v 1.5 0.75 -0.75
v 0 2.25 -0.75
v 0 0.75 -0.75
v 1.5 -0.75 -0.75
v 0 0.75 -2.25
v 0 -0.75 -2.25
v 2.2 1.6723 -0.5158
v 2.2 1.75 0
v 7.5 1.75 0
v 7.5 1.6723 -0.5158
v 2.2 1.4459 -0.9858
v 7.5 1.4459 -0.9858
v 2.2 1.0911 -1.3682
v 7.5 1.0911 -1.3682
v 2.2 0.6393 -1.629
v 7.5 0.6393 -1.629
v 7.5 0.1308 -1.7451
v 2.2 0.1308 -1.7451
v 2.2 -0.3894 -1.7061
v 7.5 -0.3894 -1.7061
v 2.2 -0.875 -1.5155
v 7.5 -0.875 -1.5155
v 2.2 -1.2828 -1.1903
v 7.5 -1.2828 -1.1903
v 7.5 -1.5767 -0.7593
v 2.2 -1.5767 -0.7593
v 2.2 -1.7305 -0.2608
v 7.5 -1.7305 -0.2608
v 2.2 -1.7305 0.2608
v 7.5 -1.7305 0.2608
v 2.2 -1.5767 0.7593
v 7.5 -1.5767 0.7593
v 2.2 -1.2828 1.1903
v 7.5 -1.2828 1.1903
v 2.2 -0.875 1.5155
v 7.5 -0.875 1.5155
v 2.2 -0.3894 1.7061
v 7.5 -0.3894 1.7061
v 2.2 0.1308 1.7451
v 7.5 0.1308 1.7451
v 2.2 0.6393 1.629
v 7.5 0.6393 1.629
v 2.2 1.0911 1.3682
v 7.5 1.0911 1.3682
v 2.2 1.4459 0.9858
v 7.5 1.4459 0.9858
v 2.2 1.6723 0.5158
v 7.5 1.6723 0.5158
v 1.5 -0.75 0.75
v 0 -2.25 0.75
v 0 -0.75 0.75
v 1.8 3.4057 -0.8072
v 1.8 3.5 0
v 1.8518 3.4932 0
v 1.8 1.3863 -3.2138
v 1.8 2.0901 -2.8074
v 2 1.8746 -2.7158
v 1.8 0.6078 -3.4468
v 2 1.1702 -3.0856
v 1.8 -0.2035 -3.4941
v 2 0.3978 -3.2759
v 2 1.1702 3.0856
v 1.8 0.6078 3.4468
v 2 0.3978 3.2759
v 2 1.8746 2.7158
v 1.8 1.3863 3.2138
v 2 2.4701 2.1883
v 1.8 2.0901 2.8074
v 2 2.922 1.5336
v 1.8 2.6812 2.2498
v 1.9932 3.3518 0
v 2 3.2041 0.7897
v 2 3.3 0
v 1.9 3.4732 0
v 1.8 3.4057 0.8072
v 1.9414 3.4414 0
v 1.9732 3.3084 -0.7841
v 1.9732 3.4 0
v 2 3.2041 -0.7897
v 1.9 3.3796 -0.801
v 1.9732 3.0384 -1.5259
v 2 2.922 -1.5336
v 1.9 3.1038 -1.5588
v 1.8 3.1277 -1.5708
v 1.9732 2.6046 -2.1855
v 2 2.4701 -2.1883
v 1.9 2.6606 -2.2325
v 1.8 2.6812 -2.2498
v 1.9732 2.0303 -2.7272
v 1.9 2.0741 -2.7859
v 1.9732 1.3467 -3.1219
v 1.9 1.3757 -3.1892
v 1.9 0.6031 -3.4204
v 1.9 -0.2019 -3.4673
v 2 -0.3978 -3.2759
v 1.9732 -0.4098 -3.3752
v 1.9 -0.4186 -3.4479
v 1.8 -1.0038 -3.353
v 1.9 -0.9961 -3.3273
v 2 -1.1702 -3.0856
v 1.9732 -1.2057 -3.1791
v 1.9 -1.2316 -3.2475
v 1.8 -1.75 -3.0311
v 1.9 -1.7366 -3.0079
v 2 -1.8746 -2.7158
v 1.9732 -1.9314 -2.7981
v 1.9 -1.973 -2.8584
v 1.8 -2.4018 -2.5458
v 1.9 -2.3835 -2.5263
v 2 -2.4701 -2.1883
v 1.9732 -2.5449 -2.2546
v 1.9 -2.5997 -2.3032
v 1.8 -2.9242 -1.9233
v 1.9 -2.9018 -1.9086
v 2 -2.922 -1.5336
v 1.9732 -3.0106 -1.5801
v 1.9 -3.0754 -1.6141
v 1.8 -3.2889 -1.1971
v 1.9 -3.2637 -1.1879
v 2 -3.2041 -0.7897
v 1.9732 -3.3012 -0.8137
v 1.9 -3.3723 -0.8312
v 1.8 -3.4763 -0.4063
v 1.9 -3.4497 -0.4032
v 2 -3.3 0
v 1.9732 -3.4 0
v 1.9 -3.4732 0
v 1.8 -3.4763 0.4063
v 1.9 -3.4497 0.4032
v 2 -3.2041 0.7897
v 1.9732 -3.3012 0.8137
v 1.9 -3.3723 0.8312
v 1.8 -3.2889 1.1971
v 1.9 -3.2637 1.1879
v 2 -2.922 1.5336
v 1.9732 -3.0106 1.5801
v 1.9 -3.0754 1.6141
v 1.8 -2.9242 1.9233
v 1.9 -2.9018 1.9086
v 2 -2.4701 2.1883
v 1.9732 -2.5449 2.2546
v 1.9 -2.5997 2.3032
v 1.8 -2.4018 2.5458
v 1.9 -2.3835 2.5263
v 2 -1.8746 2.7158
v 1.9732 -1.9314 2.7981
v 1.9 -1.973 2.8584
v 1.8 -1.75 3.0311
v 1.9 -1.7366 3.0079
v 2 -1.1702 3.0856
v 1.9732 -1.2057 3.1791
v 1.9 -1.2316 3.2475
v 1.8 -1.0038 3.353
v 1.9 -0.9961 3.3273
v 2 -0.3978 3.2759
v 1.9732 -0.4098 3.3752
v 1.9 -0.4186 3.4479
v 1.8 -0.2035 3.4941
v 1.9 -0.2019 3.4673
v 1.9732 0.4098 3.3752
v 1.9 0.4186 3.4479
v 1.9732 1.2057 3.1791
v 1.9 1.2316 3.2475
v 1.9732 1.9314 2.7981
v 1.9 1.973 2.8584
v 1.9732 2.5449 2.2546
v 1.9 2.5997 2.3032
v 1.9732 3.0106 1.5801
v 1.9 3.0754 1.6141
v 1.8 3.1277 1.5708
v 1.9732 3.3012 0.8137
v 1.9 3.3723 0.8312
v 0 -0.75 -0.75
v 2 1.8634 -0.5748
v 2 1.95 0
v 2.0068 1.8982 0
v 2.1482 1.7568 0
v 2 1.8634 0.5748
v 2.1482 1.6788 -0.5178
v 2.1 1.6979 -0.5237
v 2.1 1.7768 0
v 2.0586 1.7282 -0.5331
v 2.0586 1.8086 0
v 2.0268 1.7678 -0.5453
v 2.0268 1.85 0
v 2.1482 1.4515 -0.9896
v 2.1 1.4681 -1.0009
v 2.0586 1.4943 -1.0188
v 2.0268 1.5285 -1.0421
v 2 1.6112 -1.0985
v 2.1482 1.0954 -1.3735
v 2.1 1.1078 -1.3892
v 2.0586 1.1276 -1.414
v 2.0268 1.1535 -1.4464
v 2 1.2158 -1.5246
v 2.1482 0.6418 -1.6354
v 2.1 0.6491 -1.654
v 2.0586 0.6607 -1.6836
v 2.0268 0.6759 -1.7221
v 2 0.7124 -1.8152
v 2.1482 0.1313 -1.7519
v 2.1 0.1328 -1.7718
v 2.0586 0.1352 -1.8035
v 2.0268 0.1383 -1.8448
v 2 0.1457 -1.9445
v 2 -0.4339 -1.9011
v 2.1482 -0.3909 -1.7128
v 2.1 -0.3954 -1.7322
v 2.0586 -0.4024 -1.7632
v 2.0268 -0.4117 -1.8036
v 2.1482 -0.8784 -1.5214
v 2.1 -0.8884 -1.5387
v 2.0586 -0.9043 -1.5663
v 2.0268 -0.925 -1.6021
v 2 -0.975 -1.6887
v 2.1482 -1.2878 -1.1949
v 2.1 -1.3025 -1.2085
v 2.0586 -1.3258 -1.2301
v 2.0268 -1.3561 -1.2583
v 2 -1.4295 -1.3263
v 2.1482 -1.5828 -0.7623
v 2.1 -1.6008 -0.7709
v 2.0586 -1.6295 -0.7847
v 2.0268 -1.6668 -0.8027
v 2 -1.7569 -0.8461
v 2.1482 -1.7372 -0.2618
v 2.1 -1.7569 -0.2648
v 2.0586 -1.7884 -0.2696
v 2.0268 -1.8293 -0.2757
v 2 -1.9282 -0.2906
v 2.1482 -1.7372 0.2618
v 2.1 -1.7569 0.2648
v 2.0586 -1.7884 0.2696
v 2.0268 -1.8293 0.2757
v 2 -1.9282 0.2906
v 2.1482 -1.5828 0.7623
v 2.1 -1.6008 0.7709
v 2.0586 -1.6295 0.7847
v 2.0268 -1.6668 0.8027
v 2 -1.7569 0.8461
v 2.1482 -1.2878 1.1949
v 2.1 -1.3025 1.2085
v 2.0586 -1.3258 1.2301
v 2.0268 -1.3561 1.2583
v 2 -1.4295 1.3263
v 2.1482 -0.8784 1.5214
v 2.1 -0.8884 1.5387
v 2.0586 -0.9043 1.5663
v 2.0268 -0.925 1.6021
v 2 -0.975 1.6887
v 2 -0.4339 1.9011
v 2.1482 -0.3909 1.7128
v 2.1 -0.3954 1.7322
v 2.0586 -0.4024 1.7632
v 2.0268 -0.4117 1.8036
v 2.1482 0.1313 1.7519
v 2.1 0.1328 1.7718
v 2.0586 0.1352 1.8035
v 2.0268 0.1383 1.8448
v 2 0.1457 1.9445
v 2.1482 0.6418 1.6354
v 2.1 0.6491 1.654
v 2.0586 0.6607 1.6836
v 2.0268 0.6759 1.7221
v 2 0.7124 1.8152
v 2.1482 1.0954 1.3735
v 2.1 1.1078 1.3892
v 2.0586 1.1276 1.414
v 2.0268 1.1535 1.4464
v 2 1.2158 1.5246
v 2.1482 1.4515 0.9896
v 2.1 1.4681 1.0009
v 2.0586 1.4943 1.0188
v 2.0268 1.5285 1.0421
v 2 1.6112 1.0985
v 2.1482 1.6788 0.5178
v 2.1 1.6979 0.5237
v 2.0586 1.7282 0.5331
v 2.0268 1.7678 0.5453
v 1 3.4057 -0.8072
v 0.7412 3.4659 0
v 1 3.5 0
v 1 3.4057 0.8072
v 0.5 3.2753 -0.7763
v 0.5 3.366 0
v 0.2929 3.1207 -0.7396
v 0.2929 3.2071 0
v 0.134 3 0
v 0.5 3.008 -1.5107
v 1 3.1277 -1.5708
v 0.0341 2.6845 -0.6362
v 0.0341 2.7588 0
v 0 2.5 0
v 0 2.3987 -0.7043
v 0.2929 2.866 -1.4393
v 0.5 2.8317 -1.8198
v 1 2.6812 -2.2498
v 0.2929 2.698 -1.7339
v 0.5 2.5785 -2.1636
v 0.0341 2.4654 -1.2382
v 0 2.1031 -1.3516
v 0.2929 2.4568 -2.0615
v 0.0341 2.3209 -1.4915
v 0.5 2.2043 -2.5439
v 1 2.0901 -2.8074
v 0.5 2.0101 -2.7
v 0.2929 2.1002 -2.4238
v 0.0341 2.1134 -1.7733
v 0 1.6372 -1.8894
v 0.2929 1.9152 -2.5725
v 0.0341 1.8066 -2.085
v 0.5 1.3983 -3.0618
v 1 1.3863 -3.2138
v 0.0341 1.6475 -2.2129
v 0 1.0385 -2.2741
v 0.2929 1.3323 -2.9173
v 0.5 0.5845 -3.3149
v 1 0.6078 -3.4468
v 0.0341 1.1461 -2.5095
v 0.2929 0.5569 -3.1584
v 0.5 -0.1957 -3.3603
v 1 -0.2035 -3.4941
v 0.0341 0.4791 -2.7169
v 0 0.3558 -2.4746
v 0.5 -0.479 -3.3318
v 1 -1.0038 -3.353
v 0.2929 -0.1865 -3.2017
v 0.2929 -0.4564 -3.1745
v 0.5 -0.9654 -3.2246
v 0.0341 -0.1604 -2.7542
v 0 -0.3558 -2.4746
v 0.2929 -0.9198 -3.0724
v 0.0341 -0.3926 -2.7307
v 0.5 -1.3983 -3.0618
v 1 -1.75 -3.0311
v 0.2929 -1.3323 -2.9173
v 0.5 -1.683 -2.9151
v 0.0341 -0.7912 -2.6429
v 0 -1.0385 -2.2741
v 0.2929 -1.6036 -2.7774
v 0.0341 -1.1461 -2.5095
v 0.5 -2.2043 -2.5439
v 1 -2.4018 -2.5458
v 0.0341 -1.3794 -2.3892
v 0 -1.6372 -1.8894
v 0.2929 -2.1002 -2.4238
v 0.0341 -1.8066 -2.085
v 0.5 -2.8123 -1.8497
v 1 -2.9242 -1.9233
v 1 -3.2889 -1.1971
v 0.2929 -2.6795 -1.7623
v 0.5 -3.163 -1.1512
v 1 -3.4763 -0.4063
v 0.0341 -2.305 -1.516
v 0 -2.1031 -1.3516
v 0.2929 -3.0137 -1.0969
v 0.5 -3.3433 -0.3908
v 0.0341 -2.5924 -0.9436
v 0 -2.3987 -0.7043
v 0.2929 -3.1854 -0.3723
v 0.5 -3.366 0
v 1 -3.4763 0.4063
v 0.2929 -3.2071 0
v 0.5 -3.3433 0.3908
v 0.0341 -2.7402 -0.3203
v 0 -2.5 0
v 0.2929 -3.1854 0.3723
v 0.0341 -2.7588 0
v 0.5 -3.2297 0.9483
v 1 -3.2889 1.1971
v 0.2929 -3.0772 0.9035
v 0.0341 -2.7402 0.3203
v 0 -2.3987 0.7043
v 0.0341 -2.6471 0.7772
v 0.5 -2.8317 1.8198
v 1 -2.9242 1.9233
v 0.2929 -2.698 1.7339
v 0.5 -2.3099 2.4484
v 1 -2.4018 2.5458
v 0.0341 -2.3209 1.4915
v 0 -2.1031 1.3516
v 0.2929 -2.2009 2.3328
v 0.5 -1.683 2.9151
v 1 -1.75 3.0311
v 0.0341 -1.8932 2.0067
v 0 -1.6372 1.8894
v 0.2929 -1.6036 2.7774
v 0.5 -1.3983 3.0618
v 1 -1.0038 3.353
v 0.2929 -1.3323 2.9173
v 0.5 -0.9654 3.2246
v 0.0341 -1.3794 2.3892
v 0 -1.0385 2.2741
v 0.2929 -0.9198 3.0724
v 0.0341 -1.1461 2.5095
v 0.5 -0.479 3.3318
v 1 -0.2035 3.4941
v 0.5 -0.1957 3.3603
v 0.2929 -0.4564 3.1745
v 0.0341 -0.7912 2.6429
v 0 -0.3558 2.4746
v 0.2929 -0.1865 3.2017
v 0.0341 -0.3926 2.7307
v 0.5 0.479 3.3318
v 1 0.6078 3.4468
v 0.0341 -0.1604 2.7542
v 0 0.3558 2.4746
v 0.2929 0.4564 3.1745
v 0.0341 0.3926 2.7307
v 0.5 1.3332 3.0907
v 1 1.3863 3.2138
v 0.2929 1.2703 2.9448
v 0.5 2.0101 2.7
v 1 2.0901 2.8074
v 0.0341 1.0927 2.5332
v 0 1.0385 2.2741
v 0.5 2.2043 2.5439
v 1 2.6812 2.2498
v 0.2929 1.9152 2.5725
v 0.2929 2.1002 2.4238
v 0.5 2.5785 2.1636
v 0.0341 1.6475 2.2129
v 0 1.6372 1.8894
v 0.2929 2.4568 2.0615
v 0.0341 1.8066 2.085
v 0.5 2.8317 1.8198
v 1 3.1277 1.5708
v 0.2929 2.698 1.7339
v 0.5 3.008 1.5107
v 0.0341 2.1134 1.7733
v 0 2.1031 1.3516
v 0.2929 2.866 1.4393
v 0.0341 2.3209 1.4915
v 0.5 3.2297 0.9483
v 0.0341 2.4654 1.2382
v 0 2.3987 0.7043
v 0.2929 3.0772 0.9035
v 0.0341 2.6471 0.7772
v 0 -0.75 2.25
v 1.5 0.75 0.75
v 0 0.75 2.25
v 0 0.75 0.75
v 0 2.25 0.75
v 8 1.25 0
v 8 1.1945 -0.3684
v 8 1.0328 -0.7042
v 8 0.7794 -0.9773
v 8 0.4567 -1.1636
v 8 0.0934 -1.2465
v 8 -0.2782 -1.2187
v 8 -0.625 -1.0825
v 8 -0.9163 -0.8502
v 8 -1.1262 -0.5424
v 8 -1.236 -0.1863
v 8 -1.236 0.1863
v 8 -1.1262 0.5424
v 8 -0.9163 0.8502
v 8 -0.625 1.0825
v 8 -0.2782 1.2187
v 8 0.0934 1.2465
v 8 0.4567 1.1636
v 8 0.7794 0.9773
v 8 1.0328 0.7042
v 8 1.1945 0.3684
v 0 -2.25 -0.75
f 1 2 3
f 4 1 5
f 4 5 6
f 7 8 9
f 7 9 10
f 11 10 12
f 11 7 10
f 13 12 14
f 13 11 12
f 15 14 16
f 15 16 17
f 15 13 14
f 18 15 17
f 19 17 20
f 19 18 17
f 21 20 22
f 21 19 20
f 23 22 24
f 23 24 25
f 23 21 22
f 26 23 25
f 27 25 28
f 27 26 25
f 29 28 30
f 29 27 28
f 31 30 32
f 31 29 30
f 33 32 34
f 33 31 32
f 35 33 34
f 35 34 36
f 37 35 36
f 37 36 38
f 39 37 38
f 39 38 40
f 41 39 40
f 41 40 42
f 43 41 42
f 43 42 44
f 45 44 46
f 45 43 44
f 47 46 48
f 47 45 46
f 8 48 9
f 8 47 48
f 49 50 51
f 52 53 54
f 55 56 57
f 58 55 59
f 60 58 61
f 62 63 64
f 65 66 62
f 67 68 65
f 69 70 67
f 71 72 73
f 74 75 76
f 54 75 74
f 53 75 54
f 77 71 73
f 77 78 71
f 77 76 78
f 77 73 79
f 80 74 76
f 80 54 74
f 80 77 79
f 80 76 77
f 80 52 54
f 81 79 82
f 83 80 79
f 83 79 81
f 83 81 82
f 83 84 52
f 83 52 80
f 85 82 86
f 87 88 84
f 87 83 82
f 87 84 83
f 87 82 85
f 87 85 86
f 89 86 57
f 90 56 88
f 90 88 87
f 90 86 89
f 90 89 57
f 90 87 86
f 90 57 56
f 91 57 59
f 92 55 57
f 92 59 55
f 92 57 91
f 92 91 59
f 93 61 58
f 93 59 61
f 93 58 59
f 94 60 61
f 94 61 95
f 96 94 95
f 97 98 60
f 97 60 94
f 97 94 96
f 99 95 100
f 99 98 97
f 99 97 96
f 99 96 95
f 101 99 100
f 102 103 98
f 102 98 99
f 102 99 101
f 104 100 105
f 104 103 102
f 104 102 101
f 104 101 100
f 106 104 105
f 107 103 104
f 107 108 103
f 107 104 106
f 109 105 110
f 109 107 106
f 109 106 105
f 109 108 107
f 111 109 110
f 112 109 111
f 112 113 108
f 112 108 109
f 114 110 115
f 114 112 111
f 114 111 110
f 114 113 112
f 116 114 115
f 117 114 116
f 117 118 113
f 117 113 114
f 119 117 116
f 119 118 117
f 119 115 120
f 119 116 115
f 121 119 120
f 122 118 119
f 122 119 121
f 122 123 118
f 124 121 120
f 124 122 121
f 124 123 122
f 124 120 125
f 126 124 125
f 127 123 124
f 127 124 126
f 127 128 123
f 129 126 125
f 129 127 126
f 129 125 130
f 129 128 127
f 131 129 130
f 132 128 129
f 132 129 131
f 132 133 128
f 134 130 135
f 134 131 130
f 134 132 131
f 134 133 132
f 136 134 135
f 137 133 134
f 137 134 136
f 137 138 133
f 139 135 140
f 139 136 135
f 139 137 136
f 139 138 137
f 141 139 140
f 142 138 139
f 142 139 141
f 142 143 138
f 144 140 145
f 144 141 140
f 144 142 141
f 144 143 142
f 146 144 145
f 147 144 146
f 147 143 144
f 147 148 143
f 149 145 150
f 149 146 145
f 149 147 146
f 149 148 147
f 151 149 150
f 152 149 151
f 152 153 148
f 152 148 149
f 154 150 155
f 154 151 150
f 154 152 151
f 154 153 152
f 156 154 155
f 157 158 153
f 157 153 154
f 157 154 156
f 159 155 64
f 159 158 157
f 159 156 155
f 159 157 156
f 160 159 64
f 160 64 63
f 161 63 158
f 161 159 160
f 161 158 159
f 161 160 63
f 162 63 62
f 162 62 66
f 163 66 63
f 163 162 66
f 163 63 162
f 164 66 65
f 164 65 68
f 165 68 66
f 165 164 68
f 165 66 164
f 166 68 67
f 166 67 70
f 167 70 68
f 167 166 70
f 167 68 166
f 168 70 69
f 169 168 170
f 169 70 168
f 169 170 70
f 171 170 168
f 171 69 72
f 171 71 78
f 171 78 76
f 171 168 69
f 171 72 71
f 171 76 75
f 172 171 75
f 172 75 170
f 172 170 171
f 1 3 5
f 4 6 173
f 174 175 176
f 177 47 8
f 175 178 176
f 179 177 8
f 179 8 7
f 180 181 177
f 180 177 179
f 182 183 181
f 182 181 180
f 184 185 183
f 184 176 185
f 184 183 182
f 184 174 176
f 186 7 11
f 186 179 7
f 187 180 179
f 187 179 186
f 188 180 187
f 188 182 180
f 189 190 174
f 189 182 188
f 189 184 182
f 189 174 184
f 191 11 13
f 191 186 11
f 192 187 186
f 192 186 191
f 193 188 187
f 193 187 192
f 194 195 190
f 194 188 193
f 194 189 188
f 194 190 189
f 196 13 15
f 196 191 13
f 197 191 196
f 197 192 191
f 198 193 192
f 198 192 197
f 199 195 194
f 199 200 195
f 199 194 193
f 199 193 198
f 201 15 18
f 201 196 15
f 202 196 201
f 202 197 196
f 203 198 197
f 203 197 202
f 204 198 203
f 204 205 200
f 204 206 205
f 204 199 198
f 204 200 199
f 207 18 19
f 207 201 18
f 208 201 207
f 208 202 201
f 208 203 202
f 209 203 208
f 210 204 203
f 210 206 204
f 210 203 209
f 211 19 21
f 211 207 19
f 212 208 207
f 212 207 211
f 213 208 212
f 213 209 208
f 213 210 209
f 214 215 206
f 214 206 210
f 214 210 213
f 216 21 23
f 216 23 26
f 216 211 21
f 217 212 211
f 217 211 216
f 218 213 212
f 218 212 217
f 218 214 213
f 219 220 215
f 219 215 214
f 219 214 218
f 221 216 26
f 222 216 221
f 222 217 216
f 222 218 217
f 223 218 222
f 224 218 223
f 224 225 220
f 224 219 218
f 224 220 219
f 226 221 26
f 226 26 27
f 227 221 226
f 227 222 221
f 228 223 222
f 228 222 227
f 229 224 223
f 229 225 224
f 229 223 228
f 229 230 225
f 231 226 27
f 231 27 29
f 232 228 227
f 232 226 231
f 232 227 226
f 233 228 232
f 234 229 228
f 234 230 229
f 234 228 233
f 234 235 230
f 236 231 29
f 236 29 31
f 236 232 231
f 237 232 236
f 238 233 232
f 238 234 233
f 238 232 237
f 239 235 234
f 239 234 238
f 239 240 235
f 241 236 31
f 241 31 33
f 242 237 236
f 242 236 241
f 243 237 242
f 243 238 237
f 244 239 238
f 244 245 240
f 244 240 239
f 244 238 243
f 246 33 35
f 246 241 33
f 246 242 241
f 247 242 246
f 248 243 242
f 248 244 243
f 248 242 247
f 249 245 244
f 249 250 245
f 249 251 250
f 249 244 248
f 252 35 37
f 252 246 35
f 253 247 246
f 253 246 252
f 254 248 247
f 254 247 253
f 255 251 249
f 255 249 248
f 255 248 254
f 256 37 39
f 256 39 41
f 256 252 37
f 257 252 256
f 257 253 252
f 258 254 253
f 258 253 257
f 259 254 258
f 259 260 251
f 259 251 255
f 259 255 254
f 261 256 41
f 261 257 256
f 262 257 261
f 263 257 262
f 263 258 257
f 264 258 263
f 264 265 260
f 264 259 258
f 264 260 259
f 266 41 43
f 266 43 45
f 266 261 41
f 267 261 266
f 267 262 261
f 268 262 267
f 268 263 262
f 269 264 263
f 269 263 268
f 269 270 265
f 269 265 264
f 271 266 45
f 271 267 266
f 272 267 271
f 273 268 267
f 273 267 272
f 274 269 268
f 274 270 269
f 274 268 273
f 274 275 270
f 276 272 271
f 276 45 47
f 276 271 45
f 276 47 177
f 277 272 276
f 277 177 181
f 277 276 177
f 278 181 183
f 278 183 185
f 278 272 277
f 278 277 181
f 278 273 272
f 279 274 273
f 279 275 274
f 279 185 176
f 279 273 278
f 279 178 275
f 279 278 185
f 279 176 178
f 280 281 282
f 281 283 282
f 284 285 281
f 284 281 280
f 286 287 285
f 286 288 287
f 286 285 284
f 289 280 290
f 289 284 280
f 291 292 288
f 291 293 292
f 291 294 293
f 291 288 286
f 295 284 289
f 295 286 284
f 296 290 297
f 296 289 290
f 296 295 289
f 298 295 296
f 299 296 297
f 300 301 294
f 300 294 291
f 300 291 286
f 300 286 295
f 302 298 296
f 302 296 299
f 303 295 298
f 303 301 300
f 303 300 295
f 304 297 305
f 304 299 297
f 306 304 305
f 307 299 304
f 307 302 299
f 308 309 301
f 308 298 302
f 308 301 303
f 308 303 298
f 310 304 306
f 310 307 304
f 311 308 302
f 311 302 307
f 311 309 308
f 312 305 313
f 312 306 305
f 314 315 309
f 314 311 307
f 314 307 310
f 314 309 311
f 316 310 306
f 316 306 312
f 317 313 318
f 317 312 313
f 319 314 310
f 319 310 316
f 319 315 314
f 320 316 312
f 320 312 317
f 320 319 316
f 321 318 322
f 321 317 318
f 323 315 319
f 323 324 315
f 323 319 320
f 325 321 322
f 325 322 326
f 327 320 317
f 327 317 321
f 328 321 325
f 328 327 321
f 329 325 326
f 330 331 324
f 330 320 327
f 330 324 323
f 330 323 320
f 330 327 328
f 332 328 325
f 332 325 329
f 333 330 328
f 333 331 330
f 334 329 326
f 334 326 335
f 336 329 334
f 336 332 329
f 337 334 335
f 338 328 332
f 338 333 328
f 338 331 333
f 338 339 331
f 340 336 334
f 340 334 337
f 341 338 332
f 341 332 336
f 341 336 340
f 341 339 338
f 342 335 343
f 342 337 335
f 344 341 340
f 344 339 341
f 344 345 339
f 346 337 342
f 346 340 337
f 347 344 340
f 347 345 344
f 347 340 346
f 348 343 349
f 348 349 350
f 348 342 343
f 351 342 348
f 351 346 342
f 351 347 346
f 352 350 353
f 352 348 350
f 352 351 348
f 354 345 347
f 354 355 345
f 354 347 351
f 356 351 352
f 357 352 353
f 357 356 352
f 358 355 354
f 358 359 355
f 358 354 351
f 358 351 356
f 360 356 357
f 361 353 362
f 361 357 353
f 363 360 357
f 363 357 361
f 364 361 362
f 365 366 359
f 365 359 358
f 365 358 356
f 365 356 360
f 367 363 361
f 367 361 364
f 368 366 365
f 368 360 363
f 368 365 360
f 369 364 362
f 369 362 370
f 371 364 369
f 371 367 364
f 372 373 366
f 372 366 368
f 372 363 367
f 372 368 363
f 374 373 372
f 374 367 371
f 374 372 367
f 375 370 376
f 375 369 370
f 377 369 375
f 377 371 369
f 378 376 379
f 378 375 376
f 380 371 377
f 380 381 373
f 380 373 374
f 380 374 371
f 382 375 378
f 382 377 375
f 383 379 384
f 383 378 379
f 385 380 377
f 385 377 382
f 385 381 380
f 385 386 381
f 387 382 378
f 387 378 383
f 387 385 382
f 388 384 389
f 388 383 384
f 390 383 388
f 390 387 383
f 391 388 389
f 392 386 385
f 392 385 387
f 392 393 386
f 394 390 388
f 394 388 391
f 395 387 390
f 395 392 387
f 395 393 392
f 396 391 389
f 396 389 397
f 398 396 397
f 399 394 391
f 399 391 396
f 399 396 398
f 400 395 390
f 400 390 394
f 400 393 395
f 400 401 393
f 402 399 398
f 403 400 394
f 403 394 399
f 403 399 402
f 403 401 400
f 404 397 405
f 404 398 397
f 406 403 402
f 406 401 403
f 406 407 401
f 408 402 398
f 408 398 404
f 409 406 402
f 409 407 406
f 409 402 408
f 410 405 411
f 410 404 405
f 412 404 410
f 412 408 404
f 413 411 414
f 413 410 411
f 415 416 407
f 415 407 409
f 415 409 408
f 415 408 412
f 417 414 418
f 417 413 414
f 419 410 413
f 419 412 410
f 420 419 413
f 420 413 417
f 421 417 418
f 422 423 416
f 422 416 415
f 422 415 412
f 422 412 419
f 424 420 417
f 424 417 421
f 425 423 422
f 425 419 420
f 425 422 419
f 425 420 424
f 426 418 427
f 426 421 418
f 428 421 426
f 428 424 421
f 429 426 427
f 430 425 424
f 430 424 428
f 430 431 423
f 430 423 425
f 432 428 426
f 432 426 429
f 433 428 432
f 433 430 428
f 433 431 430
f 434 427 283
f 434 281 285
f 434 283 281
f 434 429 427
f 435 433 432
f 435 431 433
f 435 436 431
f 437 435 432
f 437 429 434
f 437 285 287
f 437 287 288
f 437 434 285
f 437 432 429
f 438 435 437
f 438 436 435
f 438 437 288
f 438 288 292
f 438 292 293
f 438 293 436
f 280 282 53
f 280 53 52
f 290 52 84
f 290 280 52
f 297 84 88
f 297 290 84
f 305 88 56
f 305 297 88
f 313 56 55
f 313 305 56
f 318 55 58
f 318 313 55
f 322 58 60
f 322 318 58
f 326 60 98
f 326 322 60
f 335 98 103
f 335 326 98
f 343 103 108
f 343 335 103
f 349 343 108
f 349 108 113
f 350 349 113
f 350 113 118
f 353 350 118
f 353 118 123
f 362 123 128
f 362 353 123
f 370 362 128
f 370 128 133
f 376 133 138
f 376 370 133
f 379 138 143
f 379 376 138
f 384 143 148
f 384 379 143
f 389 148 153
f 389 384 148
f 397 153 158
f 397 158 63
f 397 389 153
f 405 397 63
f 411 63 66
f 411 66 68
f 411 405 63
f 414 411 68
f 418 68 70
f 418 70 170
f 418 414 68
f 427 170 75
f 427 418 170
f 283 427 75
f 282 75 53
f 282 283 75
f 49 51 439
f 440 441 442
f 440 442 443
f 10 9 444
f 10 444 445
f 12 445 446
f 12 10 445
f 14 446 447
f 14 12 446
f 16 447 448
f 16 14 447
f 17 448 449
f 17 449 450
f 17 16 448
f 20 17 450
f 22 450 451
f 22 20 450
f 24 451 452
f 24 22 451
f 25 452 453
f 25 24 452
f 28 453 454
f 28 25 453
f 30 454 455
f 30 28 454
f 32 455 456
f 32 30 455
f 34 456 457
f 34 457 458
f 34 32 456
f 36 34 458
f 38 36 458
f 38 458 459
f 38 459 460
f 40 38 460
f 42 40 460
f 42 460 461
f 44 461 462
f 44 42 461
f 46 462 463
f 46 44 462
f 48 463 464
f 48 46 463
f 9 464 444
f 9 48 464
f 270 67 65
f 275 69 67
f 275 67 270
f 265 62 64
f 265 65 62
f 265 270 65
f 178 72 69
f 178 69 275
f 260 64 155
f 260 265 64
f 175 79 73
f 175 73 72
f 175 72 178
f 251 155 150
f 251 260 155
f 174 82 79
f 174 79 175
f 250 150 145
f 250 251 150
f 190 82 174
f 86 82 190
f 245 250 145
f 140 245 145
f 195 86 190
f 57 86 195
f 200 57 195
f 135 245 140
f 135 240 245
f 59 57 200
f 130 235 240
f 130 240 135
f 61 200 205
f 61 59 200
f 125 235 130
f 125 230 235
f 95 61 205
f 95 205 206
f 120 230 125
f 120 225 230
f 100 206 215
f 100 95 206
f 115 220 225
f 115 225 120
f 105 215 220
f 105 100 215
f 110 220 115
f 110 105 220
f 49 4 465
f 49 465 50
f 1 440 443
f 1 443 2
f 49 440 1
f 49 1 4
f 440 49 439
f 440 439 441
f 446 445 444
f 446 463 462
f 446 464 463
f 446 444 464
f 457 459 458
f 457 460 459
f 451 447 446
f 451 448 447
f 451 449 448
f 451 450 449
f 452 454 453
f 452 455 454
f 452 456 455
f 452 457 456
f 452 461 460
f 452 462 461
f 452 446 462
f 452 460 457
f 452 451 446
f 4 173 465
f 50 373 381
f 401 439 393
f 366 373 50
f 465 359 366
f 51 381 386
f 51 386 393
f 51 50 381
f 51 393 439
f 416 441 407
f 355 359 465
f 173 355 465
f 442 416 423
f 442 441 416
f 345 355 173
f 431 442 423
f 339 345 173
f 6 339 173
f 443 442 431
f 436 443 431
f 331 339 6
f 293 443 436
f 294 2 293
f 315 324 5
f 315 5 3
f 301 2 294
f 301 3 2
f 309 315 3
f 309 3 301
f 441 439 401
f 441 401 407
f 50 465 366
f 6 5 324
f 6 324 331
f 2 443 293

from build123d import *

# Parameters (mm, degrees)
F2_SIZE  = 0.5
F3_R     = 0.2
F4_R     = 0.2
F5_R     = 1
F7_DEPTH = 1.5
F8_SIZE  = 1.49999


# Not quite as in the source:
# - a fillet or chamfer is up to 0.001 mm smaller than in the source, because OpenCascade refuses the exact size


with BuildPart() as f1:
    # F0 (on Top) → F1 (revolve)
    with BuildSketch(Plane.XY):
        Polygon((0, 3.5), (0, 0), (8, 0), (8, 1.75), (2, 1.75), (2, 3.5), align=None)
    revolve(axis=Axis((4, 0, 0), (-1, 0, 0)))

    # F2
    f2_edges = [f1.edges().sort_by_distance(p)[0] for p in [
        (8, -1.75, 0),
    ]]
    chamfer(f2_edges, length=F2_SIZE)

    # F3
    f3_edges = [f1.edges().sort_by_distance(p)[0] for p in [
        (2, -1.75, 0),
    ]]
    fillet(f3_edges, radius=F3_R)

    # F4
    f4_edges = [f1.edges().sort_by_distance(p)[0] for p in [
        (2, -3.5, 0),
    ]]
    fillet(f4_edges, radius=F4_R)

    # F5
    f5_edges = [f1.edges().sort_by_distance(p)[0] for p in [
        (0, -3.5, 0),
    ]]
    fillet(f5_edges, radius=F5_R)

    # F6 (on face) → F7 (cut)
    with BuildSketch(Plane(origin=(0, 0, 0), x_dir=(0, -1, 0), z_dir=(-1, 0, 0))):
        Polygon((-0.75, 2.25), (-0.75, 0.75), (-2.25, 0.75), (-2.25, -0.75), (-0.75, -0.75), (-0.75, -2.25), (0.75, -2.25), (0.75, -0.75), (2.25, -0.75), (2.25, 0.75), (0.75, 0.75), (0.75, 2.25), align=None)
    extrude(amount=-F7_DEPTH, mode=Mode.SUBTRACT)

    # F8 (size 1.5 in the source; OpenCascade refuses exactly that, so slightly less here)
    f8_edges = [f1.edges().sort_by_distance(p)[0] for p in [
        (1.5, 2.25, 0),
        (1.5, 0, 2.25),
        (1.5, 0, -2.25),
        (1.5, -2.25, 0),
    ]]
    chamfer(f8_edges, length=F8_SIZE)


solid = f1.part
